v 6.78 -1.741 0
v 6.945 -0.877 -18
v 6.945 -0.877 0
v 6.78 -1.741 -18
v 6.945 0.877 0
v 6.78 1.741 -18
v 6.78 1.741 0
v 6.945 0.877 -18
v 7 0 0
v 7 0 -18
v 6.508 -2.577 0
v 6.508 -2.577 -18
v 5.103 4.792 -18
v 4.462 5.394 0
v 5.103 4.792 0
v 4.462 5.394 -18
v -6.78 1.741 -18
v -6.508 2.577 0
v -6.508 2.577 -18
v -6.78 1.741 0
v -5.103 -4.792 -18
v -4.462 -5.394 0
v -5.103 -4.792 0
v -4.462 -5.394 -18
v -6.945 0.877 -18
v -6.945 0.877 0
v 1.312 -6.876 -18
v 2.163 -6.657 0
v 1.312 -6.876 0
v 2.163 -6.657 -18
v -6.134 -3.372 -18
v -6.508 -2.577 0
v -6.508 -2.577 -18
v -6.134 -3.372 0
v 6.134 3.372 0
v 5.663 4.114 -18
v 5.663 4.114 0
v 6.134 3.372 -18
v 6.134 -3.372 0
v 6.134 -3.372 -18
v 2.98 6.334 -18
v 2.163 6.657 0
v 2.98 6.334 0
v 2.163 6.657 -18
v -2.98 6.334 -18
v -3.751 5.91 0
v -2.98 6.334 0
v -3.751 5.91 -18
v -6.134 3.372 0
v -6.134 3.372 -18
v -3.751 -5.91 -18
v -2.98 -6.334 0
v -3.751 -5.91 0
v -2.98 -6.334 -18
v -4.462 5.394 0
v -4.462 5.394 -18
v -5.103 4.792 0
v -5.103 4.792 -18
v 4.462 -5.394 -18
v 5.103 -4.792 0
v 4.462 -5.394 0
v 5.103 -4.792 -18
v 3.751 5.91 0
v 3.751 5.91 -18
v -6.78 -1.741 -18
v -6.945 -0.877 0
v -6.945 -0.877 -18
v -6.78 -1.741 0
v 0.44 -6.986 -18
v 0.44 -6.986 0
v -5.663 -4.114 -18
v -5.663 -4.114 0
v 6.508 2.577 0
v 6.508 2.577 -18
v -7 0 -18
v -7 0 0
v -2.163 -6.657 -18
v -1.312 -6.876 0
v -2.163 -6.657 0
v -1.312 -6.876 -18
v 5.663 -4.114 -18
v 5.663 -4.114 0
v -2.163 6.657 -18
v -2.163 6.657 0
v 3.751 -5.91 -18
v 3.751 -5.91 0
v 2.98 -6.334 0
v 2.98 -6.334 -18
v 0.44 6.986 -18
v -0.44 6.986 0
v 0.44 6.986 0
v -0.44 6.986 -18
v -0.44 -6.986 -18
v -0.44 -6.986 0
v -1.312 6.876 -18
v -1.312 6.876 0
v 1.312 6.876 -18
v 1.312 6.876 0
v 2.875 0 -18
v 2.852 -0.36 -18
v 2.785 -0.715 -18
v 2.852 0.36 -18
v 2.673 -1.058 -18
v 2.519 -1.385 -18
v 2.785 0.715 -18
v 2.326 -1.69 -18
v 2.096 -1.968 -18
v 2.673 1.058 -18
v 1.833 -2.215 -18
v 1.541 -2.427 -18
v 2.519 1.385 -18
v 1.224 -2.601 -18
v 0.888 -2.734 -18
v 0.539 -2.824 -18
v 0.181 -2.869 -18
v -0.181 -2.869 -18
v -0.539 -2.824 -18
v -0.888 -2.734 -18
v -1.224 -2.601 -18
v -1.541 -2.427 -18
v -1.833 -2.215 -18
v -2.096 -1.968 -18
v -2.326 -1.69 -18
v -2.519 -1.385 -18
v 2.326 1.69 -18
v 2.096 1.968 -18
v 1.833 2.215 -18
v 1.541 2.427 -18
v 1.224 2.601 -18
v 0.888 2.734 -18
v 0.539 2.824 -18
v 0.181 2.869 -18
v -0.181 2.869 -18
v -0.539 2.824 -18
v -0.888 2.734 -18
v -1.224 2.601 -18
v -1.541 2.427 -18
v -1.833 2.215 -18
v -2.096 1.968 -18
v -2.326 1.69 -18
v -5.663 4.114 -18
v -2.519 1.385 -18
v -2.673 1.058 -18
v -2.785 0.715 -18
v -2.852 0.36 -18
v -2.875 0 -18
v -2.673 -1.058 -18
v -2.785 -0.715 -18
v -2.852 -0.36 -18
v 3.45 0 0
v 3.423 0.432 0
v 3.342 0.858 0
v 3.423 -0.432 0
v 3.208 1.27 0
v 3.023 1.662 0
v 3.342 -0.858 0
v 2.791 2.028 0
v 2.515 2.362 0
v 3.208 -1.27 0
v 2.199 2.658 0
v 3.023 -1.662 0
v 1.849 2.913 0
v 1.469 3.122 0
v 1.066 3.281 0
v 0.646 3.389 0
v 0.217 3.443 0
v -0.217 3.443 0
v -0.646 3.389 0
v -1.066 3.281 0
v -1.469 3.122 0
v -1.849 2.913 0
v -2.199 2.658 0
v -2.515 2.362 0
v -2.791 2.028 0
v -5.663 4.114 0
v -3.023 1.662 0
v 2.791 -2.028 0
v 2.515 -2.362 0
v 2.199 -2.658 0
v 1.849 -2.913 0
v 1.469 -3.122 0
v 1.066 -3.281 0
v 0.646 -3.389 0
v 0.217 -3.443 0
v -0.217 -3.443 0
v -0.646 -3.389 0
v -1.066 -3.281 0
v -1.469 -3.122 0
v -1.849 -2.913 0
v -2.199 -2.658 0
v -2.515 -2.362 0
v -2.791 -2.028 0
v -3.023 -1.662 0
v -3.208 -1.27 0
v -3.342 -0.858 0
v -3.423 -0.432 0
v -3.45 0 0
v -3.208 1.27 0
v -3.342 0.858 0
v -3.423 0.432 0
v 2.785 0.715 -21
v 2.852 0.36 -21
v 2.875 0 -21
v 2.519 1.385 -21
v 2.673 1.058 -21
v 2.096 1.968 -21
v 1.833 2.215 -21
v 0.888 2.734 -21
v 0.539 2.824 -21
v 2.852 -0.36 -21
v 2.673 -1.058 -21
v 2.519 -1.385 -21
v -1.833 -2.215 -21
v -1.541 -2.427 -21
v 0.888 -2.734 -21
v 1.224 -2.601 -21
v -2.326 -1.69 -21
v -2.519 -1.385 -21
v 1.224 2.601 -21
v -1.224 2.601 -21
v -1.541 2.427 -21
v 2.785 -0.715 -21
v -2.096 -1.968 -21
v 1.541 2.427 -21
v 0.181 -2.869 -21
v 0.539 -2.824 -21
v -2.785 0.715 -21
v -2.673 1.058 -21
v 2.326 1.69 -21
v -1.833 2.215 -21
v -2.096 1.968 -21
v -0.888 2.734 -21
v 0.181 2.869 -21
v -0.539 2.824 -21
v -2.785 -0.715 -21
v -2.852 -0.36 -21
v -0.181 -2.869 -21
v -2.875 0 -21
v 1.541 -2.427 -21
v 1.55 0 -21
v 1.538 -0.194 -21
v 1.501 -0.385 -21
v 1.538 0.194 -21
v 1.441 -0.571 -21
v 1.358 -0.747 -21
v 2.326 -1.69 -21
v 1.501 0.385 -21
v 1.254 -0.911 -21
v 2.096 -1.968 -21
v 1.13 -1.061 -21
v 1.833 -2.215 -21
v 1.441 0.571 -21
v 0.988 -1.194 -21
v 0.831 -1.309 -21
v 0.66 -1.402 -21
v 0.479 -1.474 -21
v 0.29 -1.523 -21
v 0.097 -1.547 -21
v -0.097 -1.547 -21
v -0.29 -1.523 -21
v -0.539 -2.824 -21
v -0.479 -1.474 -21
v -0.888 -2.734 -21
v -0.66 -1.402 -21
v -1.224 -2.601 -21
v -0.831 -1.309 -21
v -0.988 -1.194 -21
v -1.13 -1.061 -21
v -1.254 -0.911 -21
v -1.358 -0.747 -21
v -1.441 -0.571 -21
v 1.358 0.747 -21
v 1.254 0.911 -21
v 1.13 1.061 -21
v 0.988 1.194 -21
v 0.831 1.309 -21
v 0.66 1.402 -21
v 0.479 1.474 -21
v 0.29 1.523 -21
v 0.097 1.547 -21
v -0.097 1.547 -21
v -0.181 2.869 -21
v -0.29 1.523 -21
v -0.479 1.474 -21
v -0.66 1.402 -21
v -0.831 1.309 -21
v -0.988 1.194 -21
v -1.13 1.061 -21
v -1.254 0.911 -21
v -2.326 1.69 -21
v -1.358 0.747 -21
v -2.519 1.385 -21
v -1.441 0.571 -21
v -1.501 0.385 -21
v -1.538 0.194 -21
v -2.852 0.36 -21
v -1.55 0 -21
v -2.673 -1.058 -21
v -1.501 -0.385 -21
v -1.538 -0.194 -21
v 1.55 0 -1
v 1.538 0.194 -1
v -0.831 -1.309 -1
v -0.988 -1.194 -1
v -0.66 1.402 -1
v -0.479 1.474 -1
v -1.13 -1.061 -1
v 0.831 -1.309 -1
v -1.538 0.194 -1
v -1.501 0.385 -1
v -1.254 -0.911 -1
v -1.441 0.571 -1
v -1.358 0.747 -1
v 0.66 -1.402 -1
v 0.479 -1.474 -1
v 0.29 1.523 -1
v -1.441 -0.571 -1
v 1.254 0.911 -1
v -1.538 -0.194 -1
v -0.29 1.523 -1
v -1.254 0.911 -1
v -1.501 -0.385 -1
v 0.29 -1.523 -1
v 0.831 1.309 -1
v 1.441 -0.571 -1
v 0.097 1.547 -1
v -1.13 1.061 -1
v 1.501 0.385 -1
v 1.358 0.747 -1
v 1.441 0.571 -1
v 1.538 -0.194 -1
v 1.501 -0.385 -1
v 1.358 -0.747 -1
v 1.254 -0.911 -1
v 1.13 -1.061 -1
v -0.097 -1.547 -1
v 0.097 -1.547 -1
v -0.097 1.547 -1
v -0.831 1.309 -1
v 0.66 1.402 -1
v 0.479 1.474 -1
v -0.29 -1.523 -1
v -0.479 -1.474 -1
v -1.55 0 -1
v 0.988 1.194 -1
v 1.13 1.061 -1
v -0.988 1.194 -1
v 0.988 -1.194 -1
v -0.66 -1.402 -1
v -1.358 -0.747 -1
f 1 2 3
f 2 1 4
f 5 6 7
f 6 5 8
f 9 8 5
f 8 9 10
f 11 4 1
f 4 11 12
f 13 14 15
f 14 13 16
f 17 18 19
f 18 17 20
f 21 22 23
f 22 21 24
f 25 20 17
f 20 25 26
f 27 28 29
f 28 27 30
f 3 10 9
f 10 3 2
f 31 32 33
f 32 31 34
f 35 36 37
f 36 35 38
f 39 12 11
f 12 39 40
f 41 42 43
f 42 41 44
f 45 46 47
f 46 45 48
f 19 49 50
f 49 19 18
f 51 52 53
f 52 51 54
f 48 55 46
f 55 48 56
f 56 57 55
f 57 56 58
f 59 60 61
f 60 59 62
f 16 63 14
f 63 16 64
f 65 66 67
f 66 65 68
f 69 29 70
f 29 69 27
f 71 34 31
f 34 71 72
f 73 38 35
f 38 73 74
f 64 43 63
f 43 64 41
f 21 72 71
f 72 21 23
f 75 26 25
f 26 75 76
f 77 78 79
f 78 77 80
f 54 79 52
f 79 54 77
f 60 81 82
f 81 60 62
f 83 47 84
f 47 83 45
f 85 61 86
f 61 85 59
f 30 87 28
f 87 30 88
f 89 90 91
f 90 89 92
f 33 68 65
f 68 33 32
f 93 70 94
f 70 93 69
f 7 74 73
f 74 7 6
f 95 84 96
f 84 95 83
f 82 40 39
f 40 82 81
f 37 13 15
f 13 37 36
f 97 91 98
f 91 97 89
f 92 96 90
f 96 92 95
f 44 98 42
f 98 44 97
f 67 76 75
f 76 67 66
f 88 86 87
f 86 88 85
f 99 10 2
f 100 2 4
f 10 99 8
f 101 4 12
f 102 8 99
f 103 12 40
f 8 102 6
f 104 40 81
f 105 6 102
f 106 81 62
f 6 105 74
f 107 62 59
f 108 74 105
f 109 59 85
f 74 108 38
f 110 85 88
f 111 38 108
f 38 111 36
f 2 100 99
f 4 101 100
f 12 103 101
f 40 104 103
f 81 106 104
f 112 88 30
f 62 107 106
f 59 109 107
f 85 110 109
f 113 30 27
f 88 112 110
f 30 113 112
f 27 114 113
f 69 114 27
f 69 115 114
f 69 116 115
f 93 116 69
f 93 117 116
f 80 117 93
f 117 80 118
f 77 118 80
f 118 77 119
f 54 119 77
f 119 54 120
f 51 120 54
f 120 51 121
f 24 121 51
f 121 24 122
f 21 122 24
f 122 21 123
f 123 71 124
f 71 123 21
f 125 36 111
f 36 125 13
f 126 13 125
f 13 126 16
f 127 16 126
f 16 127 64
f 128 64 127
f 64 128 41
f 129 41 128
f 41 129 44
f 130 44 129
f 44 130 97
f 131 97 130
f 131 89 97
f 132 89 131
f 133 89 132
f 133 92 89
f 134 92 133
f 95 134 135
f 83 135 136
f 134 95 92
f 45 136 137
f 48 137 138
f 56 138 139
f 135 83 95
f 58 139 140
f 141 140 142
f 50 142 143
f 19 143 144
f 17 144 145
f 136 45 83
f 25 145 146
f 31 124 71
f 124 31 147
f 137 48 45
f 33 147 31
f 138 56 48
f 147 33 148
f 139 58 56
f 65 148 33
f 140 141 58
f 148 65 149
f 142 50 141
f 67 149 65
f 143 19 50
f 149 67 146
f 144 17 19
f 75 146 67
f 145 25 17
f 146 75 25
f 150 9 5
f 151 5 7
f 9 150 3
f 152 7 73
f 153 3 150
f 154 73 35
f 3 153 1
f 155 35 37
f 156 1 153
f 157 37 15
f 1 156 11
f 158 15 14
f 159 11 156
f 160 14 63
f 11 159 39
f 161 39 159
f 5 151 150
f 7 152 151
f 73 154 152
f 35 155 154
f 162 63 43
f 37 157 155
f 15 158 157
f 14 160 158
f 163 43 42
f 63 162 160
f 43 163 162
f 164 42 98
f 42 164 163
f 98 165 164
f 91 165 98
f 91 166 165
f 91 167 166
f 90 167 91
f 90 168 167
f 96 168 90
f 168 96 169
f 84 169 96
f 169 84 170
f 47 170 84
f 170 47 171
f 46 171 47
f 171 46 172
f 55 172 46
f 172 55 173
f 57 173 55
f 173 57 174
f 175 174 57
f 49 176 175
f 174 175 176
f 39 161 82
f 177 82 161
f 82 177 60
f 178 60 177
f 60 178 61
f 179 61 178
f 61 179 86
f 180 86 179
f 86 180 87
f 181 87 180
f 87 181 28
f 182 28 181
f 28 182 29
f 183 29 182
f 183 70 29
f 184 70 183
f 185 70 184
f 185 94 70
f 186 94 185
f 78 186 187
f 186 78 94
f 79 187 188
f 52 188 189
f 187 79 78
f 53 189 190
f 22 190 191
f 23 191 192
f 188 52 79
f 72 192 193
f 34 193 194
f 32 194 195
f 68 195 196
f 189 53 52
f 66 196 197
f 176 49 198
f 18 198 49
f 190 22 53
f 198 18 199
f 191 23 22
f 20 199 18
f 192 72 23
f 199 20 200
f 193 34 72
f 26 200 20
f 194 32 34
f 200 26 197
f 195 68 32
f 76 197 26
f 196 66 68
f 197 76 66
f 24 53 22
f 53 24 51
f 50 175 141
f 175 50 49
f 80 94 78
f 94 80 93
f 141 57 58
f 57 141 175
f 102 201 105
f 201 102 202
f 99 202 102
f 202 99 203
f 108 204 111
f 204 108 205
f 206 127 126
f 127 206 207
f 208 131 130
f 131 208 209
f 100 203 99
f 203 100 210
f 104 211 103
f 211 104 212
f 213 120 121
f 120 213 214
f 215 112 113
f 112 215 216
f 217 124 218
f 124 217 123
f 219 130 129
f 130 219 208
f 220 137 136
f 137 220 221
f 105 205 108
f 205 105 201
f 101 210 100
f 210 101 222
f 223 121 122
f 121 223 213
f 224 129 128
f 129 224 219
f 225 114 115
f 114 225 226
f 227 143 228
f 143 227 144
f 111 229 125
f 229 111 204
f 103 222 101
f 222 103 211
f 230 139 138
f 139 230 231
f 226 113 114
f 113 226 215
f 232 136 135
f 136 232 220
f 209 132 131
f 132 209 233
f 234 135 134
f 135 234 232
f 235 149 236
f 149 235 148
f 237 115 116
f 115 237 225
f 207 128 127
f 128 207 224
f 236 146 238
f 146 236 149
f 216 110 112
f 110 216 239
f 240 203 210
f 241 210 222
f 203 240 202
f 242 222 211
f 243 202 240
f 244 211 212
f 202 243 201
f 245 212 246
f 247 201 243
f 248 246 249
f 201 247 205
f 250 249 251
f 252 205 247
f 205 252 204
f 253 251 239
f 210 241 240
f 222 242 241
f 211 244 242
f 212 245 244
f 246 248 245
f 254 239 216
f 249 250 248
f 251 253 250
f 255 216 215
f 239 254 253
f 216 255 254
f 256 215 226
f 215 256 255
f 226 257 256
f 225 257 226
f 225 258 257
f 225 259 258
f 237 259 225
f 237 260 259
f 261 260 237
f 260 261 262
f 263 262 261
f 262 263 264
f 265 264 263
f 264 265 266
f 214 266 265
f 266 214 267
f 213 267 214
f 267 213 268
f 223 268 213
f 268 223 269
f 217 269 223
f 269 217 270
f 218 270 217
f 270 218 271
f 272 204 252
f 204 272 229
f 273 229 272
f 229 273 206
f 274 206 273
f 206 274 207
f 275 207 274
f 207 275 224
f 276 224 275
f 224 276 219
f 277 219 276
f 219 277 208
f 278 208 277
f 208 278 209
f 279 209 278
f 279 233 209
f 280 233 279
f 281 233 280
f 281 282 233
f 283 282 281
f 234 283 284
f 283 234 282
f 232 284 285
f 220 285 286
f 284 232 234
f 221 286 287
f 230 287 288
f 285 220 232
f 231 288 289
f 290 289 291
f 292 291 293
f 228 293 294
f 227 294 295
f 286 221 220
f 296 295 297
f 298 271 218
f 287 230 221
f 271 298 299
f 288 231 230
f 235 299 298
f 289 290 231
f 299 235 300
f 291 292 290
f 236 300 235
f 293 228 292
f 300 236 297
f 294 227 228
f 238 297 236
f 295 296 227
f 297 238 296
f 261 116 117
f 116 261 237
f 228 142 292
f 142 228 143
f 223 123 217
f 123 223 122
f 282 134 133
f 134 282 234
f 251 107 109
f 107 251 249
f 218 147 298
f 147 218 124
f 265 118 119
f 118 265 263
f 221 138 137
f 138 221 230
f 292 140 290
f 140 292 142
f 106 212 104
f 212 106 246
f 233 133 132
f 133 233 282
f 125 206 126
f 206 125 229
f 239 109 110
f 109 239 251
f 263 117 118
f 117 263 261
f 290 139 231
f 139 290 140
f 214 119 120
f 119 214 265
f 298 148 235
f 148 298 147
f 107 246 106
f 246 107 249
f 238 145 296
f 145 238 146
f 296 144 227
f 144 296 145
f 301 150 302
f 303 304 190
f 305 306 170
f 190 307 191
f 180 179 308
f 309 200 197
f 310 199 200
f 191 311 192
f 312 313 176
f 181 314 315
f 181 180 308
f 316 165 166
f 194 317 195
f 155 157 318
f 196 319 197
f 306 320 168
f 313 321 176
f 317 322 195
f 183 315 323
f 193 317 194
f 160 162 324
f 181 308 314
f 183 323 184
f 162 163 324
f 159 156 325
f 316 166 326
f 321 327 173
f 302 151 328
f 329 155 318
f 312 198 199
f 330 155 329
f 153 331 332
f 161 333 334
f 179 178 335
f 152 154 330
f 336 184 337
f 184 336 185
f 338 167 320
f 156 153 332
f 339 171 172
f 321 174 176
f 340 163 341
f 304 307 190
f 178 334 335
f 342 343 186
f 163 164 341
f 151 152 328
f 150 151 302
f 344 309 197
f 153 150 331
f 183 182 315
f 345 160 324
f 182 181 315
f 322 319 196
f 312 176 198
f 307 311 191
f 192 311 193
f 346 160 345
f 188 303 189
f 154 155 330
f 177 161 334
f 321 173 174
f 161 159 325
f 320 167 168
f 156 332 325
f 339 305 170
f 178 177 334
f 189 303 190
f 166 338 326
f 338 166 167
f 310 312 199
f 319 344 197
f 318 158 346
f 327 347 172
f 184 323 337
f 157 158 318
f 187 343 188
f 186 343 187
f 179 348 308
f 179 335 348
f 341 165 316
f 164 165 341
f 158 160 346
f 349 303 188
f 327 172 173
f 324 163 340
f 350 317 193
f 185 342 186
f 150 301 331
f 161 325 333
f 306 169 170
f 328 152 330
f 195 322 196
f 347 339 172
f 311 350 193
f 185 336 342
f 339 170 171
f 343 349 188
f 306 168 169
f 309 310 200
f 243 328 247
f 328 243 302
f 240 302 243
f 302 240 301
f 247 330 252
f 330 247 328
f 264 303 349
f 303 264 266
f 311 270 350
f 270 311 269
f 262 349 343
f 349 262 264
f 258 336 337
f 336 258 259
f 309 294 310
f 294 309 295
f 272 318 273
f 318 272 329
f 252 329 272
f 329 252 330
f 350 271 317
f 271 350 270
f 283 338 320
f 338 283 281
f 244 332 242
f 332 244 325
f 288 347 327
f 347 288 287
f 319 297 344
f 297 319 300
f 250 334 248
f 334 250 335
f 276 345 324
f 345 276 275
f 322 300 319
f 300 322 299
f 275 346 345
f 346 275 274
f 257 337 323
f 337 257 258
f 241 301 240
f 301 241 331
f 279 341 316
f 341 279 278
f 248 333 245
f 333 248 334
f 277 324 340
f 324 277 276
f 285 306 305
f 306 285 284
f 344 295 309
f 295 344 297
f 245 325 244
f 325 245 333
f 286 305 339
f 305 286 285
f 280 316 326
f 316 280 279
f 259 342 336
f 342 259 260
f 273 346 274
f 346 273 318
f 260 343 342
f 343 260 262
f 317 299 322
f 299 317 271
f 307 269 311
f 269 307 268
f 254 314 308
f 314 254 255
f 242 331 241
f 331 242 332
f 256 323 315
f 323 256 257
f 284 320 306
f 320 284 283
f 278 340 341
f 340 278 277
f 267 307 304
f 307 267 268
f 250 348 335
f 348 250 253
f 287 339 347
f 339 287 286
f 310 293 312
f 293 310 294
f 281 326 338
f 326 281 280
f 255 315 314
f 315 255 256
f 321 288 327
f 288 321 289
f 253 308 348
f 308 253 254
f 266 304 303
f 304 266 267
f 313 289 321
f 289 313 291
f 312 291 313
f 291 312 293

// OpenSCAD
$fn = 50;


difference() {
	union() {
		translate(v = [0, 0, -18.0000000000]) {
			cylinder(h = 18, r = 7.0000000000);
		}
		#translate(v = [0, 0, -21.0000000000]) {
			cylinder(h = 21, r = 2.8750000000);
		}
	}
	union() {
		translate(v = [0, 0, 0]) {
			rotate(a = [0, 0, 0]) {
				difference() {
					union() {
						translate(v = [0, 0, -21.0000000000]) {
							cylinder(h = 21, r = 1.2500000000);
						}
						translate(v = [0, 0, -1.0000000000]) {
							cylinder(h = 1.0000000000, r1 = 1.5500000000, r2 = 3.4500000000);
						}
						translate(v = [0, 0, -21.0000000000]) {
							cylinder(h = 21, r = 1.5500000000);
						}
						translate(v = [0, 0, -21.0000000000]) {
							cylinder(h = 21, r = 1.2500000000);
						}
					}
					union();
				}
			}
		}
	}
}
